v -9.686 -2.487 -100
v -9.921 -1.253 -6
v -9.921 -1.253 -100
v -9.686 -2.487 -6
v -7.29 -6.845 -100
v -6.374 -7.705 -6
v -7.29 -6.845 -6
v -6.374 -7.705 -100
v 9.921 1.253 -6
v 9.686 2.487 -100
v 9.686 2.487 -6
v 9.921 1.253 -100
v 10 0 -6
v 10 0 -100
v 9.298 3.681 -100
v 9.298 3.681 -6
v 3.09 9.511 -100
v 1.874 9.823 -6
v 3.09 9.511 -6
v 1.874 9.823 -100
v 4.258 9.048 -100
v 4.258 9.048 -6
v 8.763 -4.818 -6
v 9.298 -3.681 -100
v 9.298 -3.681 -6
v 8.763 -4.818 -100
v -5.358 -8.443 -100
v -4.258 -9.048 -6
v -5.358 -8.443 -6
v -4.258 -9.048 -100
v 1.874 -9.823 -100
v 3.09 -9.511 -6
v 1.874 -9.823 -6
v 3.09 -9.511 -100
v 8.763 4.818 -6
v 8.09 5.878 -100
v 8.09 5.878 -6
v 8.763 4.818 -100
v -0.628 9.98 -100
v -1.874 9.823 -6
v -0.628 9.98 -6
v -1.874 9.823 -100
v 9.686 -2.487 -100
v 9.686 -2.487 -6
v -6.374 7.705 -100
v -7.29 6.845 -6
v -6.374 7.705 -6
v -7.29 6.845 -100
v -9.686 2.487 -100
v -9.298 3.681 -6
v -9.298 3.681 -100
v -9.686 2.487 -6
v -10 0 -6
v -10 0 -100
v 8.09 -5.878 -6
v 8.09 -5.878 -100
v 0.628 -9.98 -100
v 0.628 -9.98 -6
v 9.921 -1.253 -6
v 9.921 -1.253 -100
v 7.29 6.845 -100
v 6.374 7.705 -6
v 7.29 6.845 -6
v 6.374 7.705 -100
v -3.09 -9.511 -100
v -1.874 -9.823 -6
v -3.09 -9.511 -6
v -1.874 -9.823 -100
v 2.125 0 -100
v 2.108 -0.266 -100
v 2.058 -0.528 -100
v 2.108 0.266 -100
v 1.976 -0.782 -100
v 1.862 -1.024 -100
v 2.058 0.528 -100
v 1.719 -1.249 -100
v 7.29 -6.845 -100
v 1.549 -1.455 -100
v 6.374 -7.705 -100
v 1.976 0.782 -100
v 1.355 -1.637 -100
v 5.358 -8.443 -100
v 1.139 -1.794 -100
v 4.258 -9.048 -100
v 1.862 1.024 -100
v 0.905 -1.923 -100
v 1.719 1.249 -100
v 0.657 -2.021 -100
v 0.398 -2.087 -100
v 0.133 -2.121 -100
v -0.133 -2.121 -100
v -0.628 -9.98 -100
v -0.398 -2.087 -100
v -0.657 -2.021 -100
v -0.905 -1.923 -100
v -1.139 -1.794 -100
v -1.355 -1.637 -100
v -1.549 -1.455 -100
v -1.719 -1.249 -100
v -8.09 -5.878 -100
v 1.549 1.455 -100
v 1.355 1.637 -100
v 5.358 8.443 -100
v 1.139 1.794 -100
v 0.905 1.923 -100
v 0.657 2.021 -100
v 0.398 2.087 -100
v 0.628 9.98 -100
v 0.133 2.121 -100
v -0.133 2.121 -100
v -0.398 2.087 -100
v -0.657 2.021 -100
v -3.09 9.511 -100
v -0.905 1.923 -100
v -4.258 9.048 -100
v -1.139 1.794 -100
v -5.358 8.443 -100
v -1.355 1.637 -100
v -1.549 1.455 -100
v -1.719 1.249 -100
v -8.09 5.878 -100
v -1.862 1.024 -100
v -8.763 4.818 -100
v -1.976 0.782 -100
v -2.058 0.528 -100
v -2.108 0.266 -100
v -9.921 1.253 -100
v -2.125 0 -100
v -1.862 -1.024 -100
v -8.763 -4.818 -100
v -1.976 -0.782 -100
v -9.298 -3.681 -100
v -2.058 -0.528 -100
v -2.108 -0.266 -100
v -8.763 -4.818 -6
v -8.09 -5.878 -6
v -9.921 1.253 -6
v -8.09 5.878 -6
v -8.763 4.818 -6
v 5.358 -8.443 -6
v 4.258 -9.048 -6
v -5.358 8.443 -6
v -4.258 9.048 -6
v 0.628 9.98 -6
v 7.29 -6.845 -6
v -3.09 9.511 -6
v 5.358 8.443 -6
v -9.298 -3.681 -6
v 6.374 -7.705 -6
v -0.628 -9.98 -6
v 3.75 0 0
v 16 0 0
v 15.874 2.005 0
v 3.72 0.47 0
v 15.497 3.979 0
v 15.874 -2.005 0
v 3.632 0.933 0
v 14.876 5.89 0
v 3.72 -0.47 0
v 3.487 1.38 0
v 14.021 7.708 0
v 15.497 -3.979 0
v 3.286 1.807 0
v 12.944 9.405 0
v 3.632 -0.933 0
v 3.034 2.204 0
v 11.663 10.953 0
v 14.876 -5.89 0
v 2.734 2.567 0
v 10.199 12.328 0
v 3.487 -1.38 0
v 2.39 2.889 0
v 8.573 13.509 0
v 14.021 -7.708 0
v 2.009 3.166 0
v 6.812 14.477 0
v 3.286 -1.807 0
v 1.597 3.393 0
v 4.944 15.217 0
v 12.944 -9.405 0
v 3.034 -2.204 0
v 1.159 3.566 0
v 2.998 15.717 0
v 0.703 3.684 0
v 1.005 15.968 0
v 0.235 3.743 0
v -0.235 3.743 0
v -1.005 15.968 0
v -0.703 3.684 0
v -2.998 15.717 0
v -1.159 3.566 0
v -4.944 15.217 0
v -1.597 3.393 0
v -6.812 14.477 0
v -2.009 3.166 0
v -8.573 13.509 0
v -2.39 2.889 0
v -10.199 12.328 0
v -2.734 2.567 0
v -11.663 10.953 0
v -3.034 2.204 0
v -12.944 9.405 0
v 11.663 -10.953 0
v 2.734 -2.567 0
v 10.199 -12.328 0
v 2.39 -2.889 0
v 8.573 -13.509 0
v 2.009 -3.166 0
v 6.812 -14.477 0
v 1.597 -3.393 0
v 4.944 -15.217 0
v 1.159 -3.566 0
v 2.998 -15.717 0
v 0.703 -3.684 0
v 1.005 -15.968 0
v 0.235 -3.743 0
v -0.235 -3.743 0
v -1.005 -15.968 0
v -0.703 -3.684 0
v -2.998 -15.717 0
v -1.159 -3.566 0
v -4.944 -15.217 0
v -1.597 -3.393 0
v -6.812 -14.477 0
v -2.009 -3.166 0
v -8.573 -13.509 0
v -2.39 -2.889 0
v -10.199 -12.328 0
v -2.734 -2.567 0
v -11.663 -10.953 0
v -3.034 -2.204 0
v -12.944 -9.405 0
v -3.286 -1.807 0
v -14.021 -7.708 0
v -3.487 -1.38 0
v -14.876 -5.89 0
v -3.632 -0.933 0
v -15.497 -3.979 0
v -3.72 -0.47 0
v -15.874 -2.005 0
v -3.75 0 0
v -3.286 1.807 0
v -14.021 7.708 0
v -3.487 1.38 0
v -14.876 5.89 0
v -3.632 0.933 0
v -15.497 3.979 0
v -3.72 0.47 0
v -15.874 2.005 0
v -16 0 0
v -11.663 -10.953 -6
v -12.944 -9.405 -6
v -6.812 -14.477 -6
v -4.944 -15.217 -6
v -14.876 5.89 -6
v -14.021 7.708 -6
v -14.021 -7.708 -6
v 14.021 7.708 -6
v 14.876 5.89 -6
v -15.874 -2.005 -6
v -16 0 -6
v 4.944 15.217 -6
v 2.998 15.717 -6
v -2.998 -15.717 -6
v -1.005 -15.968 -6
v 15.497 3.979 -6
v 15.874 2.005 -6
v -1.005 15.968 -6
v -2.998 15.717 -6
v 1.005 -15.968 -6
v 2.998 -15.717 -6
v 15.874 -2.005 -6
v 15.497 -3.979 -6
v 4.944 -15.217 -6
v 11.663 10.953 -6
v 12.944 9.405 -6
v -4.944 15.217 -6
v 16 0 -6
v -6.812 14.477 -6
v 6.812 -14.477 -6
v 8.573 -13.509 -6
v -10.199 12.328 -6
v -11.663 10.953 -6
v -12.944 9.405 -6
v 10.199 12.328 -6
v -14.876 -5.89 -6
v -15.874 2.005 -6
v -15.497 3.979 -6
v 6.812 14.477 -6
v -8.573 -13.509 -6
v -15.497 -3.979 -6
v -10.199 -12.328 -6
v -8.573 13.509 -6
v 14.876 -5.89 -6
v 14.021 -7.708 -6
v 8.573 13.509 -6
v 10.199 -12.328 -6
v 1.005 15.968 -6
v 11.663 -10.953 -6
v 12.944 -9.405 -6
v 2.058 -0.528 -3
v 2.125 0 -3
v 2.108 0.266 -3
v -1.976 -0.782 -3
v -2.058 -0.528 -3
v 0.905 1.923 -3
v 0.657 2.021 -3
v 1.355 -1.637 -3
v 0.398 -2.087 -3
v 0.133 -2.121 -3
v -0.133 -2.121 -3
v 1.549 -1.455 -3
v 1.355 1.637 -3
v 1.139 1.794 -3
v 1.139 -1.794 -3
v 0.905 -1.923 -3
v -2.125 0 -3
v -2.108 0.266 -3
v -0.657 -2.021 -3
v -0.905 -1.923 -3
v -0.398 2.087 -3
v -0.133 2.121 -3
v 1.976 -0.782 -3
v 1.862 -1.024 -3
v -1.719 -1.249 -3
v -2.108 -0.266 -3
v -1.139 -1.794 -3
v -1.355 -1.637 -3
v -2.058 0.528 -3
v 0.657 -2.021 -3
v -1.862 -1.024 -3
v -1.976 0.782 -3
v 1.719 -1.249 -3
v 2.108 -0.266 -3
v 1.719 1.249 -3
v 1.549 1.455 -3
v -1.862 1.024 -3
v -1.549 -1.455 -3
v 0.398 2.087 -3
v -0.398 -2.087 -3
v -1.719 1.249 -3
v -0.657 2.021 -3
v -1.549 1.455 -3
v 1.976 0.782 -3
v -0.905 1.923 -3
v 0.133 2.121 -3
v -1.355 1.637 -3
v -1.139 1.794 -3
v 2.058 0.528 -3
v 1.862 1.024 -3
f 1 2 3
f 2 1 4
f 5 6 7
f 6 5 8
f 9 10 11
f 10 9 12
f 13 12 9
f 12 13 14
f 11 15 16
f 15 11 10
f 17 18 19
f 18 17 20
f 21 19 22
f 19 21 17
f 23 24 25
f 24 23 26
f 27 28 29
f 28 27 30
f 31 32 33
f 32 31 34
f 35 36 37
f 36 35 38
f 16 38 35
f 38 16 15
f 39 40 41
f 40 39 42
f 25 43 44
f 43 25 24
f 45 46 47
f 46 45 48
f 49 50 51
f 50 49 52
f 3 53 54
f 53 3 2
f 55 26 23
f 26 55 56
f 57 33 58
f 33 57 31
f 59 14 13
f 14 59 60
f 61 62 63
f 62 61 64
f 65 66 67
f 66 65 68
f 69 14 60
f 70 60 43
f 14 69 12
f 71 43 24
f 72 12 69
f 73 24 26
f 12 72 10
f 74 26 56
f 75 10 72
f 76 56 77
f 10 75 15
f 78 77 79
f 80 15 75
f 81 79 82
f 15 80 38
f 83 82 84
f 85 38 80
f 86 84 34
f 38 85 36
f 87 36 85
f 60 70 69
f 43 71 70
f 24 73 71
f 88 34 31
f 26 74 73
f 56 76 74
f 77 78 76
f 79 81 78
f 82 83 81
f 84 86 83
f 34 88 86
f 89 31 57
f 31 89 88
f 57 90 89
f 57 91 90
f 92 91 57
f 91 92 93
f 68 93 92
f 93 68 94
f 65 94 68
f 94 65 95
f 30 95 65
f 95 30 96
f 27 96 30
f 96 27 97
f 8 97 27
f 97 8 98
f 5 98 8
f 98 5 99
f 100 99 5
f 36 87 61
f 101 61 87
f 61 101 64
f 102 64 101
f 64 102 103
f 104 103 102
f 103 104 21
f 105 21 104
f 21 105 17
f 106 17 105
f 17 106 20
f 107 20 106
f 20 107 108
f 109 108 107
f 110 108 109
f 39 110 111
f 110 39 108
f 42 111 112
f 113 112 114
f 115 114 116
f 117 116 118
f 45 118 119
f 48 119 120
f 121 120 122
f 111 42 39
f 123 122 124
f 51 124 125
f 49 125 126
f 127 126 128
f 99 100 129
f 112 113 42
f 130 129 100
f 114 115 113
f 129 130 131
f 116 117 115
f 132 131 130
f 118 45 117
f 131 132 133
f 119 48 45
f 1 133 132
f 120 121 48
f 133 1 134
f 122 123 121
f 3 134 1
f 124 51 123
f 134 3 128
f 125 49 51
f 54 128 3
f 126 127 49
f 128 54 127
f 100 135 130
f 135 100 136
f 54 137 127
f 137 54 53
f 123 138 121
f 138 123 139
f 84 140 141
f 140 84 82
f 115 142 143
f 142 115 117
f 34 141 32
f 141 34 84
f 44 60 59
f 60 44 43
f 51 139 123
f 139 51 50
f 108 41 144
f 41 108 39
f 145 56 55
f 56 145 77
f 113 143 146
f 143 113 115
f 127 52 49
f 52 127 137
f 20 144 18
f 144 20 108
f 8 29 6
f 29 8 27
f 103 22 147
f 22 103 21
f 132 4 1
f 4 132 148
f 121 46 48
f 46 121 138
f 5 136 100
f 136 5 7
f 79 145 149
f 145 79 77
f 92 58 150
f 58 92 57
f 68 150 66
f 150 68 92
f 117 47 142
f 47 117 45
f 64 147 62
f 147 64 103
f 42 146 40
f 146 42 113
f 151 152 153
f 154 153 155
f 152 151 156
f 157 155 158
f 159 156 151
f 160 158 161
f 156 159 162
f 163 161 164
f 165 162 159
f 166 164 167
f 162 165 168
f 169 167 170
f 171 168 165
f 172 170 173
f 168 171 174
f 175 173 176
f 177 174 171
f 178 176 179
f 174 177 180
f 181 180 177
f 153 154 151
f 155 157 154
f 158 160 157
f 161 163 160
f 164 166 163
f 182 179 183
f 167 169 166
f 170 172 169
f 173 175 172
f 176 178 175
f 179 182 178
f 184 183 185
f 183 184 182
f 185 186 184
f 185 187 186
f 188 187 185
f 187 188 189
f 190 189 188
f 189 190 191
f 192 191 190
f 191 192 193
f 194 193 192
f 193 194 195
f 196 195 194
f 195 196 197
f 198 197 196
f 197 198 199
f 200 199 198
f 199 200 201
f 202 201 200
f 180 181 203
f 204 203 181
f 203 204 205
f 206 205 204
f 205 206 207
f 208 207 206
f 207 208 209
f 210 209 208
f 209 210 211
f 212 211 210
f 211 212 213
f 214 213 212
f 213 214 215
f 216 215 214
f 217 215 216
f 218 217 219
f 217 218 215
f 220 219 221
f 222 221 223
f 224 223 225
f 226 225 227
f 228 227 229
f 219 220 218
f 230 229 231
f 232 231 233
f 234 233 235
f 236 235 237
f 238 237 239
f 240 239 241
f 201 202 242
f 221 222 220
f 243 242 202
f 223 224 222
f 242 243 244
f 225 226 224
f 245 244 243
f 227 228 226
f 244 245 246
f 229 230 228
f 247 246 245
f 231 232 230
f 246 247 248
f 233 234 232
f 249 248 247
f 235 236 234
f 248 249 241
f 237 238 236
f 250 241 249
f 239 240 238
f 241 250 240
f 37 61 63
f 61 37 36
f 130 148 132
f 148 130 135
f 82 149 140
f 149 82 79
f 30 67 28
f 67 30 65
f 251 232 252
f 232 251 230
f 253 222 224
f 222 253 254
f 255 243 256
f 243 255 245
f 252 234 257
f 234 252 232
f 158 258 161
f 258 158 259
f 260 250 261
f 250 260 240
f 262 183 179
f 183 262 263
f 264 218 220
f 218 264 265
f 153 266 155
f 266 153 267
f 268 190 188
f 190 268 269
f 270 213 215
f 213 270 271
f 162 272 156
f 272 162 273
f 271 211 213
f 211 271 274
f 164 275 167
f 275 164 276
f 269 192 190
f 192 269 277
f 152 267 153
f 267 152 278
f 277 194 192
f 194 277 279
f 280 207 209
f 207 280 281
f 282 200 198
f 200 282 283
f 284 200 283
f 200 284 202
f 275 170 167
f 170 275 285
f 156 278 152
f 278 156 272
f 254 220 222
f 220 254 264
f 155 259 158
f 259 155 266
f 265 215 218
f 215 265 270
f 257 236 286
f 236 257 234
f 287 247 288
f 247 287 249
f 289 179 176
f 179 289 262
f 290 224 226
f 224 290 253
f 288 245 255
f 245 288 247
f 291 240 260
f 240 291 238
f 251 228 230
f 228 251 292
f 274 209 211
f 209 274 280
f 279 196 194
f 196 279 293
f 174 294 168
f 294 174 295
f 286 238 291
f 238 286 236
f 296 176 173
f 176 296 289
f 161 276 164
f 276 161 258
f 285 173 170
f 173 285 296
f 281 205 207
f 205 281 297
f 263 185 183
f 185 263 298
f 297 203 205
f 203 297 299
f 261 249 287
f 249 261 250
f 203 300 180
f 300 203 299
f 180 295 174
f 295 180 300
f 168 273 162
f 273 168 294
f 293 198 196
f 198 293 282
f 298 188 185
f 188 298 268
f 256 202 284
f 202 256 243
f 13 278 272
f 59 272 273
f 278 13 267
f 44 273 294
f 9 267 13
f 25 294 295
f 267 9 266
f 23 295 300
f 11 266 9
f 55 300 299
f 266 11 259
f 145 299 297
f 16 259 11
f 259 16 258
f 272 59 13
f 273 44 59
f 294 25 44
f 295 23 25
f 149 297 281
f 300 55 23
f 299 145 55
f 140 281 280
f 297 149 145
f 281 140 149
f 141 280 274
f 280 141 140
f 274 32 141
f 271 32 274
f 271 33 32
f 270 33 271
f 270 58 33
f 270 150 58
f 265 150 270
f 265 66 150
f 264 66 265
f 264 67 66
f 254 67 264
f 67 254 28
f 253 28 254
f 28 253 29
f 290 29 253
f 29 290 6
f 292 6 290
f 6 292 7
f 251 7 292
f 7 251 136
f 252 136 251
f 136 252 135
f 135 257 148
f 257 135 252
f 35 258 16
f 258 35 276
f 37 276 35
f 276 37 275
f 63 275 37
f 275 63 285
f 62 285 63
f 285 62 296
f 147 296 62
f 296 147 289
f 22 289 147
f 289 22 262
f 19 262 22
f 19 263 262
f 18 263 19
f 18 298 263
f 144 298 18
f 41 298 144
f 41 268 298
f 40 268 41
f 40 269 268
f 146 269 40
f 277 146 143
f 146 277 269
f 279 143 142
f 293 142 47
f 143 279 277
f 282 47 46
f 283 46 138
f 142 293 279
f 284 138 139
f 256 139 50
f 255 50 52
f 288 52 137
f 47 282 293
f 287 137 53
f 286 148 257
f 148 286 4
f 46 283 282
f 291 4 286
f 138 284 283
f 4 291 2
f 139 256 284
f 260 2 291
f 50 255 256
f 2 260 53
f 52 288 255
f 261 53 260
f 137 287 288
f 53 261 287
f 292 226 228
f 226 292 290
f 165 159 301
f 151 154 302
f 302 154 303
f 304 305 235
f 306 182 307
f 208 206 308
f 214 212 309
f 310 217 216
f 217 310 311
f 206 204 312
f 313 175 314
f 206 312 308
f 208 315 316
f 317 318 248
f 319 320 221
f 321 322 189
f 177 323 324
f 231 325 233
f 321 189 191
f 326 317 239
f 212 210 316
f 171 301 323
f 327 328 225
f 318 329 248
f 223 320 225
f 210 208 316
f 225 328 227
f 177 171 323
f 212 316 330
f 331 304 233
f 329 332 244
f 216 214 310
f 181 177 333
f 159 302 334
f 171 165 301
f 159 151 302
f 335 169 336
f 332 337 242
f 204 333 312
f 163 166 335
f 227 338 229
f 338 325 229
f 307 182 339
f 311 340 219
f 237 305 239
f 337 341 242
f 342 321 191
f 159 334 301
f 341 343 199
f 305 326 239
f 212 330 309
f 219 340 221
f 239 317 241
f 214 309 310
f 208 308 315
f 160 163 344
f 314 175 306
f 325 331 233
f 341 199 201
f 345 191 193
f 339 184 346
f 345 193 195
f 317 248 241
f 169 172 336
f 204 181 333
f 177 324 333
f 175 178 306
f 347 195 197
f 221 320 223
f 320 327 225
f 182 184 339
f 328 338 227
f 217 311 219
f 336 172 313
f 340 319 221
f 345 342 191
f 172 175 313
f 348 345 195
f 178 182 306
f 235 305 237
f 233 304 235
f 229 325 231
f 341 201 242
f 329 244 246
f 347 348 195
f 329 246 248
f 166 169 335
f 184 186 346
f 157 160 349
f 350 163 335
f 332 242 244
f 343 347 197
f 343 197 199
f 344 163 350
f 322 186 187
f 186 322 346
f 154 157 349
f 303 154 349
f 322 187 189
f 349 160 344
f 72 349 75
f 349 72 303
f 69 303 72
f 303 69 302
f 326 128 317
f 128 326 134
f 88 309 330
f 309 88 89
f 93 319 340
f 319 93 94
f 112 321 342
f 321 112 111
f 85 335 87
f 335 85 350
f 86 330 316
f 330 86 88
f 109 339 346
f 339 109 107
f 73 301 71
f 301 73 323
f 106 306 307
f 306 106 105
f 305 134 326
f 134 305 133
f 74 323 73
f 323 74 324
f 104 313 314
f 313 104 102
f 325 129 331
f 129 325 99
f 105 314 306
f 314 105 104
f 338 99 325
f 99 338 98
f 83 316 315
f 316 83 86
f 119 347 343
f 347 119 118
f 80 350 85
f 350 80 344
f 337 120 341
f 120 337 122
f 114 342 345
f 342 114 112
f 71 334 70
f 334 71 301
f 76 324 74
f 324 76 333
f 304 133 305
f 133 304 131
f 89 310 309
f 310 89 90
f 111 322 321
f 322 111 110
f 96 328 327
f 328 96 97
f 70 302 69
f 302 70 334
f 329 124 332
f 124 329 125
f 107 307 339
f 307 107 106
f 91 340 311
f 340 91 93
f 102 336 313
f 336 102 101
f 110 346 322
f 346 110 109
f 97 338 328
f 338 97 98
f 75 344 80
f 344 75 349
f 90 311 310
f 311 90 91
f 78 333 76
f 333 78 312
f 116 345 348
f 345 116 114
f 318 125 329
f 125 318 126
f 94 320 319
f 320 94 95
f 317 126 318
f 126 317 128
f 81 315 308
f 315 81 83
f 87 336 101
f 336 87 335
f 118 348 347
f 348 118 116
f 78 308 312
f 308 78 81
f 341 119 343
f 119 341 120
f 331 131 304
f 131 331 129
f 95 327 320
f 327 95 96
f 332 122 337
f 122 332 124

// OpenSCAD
$fn = 50;


difference() {
	union() {
		translate(v = [0, 0, -100.0000000000]) {
			cylinder(h = 100, r = 10.0000000000);
		}
		translate(v = [0, 0, -6.0000000000]) {
			cylinder(h = 6, r = 16.0000000000);
		}
	}
	union() {
		translate(v = [0, 0, 0]) {
			rotate(a = [0, 0, 0]) {
				difference() {
					union() {
						#translate(v = [0, 0, -100.0000000000]) {
							cylinder(h = 100, r = 2.0000000000);
						}
						#translate(v = [0, 0, -3]) {
							cylinder(h = 3, r = 10.0000000000, r1 = 2.1250000000, r2 = 3.7500000000);
						}
						#translate(v = [0, 0, -100.0000000000]) {
							cylinder(h = 100, r = 2.1250000000);
						}
						#translate(v = [0, 0, -100.0000000000]) {
							cylinder(h = 100, r = 2.0000000000);
						}
					}
					union();
				}
			}
		}
	}
}
